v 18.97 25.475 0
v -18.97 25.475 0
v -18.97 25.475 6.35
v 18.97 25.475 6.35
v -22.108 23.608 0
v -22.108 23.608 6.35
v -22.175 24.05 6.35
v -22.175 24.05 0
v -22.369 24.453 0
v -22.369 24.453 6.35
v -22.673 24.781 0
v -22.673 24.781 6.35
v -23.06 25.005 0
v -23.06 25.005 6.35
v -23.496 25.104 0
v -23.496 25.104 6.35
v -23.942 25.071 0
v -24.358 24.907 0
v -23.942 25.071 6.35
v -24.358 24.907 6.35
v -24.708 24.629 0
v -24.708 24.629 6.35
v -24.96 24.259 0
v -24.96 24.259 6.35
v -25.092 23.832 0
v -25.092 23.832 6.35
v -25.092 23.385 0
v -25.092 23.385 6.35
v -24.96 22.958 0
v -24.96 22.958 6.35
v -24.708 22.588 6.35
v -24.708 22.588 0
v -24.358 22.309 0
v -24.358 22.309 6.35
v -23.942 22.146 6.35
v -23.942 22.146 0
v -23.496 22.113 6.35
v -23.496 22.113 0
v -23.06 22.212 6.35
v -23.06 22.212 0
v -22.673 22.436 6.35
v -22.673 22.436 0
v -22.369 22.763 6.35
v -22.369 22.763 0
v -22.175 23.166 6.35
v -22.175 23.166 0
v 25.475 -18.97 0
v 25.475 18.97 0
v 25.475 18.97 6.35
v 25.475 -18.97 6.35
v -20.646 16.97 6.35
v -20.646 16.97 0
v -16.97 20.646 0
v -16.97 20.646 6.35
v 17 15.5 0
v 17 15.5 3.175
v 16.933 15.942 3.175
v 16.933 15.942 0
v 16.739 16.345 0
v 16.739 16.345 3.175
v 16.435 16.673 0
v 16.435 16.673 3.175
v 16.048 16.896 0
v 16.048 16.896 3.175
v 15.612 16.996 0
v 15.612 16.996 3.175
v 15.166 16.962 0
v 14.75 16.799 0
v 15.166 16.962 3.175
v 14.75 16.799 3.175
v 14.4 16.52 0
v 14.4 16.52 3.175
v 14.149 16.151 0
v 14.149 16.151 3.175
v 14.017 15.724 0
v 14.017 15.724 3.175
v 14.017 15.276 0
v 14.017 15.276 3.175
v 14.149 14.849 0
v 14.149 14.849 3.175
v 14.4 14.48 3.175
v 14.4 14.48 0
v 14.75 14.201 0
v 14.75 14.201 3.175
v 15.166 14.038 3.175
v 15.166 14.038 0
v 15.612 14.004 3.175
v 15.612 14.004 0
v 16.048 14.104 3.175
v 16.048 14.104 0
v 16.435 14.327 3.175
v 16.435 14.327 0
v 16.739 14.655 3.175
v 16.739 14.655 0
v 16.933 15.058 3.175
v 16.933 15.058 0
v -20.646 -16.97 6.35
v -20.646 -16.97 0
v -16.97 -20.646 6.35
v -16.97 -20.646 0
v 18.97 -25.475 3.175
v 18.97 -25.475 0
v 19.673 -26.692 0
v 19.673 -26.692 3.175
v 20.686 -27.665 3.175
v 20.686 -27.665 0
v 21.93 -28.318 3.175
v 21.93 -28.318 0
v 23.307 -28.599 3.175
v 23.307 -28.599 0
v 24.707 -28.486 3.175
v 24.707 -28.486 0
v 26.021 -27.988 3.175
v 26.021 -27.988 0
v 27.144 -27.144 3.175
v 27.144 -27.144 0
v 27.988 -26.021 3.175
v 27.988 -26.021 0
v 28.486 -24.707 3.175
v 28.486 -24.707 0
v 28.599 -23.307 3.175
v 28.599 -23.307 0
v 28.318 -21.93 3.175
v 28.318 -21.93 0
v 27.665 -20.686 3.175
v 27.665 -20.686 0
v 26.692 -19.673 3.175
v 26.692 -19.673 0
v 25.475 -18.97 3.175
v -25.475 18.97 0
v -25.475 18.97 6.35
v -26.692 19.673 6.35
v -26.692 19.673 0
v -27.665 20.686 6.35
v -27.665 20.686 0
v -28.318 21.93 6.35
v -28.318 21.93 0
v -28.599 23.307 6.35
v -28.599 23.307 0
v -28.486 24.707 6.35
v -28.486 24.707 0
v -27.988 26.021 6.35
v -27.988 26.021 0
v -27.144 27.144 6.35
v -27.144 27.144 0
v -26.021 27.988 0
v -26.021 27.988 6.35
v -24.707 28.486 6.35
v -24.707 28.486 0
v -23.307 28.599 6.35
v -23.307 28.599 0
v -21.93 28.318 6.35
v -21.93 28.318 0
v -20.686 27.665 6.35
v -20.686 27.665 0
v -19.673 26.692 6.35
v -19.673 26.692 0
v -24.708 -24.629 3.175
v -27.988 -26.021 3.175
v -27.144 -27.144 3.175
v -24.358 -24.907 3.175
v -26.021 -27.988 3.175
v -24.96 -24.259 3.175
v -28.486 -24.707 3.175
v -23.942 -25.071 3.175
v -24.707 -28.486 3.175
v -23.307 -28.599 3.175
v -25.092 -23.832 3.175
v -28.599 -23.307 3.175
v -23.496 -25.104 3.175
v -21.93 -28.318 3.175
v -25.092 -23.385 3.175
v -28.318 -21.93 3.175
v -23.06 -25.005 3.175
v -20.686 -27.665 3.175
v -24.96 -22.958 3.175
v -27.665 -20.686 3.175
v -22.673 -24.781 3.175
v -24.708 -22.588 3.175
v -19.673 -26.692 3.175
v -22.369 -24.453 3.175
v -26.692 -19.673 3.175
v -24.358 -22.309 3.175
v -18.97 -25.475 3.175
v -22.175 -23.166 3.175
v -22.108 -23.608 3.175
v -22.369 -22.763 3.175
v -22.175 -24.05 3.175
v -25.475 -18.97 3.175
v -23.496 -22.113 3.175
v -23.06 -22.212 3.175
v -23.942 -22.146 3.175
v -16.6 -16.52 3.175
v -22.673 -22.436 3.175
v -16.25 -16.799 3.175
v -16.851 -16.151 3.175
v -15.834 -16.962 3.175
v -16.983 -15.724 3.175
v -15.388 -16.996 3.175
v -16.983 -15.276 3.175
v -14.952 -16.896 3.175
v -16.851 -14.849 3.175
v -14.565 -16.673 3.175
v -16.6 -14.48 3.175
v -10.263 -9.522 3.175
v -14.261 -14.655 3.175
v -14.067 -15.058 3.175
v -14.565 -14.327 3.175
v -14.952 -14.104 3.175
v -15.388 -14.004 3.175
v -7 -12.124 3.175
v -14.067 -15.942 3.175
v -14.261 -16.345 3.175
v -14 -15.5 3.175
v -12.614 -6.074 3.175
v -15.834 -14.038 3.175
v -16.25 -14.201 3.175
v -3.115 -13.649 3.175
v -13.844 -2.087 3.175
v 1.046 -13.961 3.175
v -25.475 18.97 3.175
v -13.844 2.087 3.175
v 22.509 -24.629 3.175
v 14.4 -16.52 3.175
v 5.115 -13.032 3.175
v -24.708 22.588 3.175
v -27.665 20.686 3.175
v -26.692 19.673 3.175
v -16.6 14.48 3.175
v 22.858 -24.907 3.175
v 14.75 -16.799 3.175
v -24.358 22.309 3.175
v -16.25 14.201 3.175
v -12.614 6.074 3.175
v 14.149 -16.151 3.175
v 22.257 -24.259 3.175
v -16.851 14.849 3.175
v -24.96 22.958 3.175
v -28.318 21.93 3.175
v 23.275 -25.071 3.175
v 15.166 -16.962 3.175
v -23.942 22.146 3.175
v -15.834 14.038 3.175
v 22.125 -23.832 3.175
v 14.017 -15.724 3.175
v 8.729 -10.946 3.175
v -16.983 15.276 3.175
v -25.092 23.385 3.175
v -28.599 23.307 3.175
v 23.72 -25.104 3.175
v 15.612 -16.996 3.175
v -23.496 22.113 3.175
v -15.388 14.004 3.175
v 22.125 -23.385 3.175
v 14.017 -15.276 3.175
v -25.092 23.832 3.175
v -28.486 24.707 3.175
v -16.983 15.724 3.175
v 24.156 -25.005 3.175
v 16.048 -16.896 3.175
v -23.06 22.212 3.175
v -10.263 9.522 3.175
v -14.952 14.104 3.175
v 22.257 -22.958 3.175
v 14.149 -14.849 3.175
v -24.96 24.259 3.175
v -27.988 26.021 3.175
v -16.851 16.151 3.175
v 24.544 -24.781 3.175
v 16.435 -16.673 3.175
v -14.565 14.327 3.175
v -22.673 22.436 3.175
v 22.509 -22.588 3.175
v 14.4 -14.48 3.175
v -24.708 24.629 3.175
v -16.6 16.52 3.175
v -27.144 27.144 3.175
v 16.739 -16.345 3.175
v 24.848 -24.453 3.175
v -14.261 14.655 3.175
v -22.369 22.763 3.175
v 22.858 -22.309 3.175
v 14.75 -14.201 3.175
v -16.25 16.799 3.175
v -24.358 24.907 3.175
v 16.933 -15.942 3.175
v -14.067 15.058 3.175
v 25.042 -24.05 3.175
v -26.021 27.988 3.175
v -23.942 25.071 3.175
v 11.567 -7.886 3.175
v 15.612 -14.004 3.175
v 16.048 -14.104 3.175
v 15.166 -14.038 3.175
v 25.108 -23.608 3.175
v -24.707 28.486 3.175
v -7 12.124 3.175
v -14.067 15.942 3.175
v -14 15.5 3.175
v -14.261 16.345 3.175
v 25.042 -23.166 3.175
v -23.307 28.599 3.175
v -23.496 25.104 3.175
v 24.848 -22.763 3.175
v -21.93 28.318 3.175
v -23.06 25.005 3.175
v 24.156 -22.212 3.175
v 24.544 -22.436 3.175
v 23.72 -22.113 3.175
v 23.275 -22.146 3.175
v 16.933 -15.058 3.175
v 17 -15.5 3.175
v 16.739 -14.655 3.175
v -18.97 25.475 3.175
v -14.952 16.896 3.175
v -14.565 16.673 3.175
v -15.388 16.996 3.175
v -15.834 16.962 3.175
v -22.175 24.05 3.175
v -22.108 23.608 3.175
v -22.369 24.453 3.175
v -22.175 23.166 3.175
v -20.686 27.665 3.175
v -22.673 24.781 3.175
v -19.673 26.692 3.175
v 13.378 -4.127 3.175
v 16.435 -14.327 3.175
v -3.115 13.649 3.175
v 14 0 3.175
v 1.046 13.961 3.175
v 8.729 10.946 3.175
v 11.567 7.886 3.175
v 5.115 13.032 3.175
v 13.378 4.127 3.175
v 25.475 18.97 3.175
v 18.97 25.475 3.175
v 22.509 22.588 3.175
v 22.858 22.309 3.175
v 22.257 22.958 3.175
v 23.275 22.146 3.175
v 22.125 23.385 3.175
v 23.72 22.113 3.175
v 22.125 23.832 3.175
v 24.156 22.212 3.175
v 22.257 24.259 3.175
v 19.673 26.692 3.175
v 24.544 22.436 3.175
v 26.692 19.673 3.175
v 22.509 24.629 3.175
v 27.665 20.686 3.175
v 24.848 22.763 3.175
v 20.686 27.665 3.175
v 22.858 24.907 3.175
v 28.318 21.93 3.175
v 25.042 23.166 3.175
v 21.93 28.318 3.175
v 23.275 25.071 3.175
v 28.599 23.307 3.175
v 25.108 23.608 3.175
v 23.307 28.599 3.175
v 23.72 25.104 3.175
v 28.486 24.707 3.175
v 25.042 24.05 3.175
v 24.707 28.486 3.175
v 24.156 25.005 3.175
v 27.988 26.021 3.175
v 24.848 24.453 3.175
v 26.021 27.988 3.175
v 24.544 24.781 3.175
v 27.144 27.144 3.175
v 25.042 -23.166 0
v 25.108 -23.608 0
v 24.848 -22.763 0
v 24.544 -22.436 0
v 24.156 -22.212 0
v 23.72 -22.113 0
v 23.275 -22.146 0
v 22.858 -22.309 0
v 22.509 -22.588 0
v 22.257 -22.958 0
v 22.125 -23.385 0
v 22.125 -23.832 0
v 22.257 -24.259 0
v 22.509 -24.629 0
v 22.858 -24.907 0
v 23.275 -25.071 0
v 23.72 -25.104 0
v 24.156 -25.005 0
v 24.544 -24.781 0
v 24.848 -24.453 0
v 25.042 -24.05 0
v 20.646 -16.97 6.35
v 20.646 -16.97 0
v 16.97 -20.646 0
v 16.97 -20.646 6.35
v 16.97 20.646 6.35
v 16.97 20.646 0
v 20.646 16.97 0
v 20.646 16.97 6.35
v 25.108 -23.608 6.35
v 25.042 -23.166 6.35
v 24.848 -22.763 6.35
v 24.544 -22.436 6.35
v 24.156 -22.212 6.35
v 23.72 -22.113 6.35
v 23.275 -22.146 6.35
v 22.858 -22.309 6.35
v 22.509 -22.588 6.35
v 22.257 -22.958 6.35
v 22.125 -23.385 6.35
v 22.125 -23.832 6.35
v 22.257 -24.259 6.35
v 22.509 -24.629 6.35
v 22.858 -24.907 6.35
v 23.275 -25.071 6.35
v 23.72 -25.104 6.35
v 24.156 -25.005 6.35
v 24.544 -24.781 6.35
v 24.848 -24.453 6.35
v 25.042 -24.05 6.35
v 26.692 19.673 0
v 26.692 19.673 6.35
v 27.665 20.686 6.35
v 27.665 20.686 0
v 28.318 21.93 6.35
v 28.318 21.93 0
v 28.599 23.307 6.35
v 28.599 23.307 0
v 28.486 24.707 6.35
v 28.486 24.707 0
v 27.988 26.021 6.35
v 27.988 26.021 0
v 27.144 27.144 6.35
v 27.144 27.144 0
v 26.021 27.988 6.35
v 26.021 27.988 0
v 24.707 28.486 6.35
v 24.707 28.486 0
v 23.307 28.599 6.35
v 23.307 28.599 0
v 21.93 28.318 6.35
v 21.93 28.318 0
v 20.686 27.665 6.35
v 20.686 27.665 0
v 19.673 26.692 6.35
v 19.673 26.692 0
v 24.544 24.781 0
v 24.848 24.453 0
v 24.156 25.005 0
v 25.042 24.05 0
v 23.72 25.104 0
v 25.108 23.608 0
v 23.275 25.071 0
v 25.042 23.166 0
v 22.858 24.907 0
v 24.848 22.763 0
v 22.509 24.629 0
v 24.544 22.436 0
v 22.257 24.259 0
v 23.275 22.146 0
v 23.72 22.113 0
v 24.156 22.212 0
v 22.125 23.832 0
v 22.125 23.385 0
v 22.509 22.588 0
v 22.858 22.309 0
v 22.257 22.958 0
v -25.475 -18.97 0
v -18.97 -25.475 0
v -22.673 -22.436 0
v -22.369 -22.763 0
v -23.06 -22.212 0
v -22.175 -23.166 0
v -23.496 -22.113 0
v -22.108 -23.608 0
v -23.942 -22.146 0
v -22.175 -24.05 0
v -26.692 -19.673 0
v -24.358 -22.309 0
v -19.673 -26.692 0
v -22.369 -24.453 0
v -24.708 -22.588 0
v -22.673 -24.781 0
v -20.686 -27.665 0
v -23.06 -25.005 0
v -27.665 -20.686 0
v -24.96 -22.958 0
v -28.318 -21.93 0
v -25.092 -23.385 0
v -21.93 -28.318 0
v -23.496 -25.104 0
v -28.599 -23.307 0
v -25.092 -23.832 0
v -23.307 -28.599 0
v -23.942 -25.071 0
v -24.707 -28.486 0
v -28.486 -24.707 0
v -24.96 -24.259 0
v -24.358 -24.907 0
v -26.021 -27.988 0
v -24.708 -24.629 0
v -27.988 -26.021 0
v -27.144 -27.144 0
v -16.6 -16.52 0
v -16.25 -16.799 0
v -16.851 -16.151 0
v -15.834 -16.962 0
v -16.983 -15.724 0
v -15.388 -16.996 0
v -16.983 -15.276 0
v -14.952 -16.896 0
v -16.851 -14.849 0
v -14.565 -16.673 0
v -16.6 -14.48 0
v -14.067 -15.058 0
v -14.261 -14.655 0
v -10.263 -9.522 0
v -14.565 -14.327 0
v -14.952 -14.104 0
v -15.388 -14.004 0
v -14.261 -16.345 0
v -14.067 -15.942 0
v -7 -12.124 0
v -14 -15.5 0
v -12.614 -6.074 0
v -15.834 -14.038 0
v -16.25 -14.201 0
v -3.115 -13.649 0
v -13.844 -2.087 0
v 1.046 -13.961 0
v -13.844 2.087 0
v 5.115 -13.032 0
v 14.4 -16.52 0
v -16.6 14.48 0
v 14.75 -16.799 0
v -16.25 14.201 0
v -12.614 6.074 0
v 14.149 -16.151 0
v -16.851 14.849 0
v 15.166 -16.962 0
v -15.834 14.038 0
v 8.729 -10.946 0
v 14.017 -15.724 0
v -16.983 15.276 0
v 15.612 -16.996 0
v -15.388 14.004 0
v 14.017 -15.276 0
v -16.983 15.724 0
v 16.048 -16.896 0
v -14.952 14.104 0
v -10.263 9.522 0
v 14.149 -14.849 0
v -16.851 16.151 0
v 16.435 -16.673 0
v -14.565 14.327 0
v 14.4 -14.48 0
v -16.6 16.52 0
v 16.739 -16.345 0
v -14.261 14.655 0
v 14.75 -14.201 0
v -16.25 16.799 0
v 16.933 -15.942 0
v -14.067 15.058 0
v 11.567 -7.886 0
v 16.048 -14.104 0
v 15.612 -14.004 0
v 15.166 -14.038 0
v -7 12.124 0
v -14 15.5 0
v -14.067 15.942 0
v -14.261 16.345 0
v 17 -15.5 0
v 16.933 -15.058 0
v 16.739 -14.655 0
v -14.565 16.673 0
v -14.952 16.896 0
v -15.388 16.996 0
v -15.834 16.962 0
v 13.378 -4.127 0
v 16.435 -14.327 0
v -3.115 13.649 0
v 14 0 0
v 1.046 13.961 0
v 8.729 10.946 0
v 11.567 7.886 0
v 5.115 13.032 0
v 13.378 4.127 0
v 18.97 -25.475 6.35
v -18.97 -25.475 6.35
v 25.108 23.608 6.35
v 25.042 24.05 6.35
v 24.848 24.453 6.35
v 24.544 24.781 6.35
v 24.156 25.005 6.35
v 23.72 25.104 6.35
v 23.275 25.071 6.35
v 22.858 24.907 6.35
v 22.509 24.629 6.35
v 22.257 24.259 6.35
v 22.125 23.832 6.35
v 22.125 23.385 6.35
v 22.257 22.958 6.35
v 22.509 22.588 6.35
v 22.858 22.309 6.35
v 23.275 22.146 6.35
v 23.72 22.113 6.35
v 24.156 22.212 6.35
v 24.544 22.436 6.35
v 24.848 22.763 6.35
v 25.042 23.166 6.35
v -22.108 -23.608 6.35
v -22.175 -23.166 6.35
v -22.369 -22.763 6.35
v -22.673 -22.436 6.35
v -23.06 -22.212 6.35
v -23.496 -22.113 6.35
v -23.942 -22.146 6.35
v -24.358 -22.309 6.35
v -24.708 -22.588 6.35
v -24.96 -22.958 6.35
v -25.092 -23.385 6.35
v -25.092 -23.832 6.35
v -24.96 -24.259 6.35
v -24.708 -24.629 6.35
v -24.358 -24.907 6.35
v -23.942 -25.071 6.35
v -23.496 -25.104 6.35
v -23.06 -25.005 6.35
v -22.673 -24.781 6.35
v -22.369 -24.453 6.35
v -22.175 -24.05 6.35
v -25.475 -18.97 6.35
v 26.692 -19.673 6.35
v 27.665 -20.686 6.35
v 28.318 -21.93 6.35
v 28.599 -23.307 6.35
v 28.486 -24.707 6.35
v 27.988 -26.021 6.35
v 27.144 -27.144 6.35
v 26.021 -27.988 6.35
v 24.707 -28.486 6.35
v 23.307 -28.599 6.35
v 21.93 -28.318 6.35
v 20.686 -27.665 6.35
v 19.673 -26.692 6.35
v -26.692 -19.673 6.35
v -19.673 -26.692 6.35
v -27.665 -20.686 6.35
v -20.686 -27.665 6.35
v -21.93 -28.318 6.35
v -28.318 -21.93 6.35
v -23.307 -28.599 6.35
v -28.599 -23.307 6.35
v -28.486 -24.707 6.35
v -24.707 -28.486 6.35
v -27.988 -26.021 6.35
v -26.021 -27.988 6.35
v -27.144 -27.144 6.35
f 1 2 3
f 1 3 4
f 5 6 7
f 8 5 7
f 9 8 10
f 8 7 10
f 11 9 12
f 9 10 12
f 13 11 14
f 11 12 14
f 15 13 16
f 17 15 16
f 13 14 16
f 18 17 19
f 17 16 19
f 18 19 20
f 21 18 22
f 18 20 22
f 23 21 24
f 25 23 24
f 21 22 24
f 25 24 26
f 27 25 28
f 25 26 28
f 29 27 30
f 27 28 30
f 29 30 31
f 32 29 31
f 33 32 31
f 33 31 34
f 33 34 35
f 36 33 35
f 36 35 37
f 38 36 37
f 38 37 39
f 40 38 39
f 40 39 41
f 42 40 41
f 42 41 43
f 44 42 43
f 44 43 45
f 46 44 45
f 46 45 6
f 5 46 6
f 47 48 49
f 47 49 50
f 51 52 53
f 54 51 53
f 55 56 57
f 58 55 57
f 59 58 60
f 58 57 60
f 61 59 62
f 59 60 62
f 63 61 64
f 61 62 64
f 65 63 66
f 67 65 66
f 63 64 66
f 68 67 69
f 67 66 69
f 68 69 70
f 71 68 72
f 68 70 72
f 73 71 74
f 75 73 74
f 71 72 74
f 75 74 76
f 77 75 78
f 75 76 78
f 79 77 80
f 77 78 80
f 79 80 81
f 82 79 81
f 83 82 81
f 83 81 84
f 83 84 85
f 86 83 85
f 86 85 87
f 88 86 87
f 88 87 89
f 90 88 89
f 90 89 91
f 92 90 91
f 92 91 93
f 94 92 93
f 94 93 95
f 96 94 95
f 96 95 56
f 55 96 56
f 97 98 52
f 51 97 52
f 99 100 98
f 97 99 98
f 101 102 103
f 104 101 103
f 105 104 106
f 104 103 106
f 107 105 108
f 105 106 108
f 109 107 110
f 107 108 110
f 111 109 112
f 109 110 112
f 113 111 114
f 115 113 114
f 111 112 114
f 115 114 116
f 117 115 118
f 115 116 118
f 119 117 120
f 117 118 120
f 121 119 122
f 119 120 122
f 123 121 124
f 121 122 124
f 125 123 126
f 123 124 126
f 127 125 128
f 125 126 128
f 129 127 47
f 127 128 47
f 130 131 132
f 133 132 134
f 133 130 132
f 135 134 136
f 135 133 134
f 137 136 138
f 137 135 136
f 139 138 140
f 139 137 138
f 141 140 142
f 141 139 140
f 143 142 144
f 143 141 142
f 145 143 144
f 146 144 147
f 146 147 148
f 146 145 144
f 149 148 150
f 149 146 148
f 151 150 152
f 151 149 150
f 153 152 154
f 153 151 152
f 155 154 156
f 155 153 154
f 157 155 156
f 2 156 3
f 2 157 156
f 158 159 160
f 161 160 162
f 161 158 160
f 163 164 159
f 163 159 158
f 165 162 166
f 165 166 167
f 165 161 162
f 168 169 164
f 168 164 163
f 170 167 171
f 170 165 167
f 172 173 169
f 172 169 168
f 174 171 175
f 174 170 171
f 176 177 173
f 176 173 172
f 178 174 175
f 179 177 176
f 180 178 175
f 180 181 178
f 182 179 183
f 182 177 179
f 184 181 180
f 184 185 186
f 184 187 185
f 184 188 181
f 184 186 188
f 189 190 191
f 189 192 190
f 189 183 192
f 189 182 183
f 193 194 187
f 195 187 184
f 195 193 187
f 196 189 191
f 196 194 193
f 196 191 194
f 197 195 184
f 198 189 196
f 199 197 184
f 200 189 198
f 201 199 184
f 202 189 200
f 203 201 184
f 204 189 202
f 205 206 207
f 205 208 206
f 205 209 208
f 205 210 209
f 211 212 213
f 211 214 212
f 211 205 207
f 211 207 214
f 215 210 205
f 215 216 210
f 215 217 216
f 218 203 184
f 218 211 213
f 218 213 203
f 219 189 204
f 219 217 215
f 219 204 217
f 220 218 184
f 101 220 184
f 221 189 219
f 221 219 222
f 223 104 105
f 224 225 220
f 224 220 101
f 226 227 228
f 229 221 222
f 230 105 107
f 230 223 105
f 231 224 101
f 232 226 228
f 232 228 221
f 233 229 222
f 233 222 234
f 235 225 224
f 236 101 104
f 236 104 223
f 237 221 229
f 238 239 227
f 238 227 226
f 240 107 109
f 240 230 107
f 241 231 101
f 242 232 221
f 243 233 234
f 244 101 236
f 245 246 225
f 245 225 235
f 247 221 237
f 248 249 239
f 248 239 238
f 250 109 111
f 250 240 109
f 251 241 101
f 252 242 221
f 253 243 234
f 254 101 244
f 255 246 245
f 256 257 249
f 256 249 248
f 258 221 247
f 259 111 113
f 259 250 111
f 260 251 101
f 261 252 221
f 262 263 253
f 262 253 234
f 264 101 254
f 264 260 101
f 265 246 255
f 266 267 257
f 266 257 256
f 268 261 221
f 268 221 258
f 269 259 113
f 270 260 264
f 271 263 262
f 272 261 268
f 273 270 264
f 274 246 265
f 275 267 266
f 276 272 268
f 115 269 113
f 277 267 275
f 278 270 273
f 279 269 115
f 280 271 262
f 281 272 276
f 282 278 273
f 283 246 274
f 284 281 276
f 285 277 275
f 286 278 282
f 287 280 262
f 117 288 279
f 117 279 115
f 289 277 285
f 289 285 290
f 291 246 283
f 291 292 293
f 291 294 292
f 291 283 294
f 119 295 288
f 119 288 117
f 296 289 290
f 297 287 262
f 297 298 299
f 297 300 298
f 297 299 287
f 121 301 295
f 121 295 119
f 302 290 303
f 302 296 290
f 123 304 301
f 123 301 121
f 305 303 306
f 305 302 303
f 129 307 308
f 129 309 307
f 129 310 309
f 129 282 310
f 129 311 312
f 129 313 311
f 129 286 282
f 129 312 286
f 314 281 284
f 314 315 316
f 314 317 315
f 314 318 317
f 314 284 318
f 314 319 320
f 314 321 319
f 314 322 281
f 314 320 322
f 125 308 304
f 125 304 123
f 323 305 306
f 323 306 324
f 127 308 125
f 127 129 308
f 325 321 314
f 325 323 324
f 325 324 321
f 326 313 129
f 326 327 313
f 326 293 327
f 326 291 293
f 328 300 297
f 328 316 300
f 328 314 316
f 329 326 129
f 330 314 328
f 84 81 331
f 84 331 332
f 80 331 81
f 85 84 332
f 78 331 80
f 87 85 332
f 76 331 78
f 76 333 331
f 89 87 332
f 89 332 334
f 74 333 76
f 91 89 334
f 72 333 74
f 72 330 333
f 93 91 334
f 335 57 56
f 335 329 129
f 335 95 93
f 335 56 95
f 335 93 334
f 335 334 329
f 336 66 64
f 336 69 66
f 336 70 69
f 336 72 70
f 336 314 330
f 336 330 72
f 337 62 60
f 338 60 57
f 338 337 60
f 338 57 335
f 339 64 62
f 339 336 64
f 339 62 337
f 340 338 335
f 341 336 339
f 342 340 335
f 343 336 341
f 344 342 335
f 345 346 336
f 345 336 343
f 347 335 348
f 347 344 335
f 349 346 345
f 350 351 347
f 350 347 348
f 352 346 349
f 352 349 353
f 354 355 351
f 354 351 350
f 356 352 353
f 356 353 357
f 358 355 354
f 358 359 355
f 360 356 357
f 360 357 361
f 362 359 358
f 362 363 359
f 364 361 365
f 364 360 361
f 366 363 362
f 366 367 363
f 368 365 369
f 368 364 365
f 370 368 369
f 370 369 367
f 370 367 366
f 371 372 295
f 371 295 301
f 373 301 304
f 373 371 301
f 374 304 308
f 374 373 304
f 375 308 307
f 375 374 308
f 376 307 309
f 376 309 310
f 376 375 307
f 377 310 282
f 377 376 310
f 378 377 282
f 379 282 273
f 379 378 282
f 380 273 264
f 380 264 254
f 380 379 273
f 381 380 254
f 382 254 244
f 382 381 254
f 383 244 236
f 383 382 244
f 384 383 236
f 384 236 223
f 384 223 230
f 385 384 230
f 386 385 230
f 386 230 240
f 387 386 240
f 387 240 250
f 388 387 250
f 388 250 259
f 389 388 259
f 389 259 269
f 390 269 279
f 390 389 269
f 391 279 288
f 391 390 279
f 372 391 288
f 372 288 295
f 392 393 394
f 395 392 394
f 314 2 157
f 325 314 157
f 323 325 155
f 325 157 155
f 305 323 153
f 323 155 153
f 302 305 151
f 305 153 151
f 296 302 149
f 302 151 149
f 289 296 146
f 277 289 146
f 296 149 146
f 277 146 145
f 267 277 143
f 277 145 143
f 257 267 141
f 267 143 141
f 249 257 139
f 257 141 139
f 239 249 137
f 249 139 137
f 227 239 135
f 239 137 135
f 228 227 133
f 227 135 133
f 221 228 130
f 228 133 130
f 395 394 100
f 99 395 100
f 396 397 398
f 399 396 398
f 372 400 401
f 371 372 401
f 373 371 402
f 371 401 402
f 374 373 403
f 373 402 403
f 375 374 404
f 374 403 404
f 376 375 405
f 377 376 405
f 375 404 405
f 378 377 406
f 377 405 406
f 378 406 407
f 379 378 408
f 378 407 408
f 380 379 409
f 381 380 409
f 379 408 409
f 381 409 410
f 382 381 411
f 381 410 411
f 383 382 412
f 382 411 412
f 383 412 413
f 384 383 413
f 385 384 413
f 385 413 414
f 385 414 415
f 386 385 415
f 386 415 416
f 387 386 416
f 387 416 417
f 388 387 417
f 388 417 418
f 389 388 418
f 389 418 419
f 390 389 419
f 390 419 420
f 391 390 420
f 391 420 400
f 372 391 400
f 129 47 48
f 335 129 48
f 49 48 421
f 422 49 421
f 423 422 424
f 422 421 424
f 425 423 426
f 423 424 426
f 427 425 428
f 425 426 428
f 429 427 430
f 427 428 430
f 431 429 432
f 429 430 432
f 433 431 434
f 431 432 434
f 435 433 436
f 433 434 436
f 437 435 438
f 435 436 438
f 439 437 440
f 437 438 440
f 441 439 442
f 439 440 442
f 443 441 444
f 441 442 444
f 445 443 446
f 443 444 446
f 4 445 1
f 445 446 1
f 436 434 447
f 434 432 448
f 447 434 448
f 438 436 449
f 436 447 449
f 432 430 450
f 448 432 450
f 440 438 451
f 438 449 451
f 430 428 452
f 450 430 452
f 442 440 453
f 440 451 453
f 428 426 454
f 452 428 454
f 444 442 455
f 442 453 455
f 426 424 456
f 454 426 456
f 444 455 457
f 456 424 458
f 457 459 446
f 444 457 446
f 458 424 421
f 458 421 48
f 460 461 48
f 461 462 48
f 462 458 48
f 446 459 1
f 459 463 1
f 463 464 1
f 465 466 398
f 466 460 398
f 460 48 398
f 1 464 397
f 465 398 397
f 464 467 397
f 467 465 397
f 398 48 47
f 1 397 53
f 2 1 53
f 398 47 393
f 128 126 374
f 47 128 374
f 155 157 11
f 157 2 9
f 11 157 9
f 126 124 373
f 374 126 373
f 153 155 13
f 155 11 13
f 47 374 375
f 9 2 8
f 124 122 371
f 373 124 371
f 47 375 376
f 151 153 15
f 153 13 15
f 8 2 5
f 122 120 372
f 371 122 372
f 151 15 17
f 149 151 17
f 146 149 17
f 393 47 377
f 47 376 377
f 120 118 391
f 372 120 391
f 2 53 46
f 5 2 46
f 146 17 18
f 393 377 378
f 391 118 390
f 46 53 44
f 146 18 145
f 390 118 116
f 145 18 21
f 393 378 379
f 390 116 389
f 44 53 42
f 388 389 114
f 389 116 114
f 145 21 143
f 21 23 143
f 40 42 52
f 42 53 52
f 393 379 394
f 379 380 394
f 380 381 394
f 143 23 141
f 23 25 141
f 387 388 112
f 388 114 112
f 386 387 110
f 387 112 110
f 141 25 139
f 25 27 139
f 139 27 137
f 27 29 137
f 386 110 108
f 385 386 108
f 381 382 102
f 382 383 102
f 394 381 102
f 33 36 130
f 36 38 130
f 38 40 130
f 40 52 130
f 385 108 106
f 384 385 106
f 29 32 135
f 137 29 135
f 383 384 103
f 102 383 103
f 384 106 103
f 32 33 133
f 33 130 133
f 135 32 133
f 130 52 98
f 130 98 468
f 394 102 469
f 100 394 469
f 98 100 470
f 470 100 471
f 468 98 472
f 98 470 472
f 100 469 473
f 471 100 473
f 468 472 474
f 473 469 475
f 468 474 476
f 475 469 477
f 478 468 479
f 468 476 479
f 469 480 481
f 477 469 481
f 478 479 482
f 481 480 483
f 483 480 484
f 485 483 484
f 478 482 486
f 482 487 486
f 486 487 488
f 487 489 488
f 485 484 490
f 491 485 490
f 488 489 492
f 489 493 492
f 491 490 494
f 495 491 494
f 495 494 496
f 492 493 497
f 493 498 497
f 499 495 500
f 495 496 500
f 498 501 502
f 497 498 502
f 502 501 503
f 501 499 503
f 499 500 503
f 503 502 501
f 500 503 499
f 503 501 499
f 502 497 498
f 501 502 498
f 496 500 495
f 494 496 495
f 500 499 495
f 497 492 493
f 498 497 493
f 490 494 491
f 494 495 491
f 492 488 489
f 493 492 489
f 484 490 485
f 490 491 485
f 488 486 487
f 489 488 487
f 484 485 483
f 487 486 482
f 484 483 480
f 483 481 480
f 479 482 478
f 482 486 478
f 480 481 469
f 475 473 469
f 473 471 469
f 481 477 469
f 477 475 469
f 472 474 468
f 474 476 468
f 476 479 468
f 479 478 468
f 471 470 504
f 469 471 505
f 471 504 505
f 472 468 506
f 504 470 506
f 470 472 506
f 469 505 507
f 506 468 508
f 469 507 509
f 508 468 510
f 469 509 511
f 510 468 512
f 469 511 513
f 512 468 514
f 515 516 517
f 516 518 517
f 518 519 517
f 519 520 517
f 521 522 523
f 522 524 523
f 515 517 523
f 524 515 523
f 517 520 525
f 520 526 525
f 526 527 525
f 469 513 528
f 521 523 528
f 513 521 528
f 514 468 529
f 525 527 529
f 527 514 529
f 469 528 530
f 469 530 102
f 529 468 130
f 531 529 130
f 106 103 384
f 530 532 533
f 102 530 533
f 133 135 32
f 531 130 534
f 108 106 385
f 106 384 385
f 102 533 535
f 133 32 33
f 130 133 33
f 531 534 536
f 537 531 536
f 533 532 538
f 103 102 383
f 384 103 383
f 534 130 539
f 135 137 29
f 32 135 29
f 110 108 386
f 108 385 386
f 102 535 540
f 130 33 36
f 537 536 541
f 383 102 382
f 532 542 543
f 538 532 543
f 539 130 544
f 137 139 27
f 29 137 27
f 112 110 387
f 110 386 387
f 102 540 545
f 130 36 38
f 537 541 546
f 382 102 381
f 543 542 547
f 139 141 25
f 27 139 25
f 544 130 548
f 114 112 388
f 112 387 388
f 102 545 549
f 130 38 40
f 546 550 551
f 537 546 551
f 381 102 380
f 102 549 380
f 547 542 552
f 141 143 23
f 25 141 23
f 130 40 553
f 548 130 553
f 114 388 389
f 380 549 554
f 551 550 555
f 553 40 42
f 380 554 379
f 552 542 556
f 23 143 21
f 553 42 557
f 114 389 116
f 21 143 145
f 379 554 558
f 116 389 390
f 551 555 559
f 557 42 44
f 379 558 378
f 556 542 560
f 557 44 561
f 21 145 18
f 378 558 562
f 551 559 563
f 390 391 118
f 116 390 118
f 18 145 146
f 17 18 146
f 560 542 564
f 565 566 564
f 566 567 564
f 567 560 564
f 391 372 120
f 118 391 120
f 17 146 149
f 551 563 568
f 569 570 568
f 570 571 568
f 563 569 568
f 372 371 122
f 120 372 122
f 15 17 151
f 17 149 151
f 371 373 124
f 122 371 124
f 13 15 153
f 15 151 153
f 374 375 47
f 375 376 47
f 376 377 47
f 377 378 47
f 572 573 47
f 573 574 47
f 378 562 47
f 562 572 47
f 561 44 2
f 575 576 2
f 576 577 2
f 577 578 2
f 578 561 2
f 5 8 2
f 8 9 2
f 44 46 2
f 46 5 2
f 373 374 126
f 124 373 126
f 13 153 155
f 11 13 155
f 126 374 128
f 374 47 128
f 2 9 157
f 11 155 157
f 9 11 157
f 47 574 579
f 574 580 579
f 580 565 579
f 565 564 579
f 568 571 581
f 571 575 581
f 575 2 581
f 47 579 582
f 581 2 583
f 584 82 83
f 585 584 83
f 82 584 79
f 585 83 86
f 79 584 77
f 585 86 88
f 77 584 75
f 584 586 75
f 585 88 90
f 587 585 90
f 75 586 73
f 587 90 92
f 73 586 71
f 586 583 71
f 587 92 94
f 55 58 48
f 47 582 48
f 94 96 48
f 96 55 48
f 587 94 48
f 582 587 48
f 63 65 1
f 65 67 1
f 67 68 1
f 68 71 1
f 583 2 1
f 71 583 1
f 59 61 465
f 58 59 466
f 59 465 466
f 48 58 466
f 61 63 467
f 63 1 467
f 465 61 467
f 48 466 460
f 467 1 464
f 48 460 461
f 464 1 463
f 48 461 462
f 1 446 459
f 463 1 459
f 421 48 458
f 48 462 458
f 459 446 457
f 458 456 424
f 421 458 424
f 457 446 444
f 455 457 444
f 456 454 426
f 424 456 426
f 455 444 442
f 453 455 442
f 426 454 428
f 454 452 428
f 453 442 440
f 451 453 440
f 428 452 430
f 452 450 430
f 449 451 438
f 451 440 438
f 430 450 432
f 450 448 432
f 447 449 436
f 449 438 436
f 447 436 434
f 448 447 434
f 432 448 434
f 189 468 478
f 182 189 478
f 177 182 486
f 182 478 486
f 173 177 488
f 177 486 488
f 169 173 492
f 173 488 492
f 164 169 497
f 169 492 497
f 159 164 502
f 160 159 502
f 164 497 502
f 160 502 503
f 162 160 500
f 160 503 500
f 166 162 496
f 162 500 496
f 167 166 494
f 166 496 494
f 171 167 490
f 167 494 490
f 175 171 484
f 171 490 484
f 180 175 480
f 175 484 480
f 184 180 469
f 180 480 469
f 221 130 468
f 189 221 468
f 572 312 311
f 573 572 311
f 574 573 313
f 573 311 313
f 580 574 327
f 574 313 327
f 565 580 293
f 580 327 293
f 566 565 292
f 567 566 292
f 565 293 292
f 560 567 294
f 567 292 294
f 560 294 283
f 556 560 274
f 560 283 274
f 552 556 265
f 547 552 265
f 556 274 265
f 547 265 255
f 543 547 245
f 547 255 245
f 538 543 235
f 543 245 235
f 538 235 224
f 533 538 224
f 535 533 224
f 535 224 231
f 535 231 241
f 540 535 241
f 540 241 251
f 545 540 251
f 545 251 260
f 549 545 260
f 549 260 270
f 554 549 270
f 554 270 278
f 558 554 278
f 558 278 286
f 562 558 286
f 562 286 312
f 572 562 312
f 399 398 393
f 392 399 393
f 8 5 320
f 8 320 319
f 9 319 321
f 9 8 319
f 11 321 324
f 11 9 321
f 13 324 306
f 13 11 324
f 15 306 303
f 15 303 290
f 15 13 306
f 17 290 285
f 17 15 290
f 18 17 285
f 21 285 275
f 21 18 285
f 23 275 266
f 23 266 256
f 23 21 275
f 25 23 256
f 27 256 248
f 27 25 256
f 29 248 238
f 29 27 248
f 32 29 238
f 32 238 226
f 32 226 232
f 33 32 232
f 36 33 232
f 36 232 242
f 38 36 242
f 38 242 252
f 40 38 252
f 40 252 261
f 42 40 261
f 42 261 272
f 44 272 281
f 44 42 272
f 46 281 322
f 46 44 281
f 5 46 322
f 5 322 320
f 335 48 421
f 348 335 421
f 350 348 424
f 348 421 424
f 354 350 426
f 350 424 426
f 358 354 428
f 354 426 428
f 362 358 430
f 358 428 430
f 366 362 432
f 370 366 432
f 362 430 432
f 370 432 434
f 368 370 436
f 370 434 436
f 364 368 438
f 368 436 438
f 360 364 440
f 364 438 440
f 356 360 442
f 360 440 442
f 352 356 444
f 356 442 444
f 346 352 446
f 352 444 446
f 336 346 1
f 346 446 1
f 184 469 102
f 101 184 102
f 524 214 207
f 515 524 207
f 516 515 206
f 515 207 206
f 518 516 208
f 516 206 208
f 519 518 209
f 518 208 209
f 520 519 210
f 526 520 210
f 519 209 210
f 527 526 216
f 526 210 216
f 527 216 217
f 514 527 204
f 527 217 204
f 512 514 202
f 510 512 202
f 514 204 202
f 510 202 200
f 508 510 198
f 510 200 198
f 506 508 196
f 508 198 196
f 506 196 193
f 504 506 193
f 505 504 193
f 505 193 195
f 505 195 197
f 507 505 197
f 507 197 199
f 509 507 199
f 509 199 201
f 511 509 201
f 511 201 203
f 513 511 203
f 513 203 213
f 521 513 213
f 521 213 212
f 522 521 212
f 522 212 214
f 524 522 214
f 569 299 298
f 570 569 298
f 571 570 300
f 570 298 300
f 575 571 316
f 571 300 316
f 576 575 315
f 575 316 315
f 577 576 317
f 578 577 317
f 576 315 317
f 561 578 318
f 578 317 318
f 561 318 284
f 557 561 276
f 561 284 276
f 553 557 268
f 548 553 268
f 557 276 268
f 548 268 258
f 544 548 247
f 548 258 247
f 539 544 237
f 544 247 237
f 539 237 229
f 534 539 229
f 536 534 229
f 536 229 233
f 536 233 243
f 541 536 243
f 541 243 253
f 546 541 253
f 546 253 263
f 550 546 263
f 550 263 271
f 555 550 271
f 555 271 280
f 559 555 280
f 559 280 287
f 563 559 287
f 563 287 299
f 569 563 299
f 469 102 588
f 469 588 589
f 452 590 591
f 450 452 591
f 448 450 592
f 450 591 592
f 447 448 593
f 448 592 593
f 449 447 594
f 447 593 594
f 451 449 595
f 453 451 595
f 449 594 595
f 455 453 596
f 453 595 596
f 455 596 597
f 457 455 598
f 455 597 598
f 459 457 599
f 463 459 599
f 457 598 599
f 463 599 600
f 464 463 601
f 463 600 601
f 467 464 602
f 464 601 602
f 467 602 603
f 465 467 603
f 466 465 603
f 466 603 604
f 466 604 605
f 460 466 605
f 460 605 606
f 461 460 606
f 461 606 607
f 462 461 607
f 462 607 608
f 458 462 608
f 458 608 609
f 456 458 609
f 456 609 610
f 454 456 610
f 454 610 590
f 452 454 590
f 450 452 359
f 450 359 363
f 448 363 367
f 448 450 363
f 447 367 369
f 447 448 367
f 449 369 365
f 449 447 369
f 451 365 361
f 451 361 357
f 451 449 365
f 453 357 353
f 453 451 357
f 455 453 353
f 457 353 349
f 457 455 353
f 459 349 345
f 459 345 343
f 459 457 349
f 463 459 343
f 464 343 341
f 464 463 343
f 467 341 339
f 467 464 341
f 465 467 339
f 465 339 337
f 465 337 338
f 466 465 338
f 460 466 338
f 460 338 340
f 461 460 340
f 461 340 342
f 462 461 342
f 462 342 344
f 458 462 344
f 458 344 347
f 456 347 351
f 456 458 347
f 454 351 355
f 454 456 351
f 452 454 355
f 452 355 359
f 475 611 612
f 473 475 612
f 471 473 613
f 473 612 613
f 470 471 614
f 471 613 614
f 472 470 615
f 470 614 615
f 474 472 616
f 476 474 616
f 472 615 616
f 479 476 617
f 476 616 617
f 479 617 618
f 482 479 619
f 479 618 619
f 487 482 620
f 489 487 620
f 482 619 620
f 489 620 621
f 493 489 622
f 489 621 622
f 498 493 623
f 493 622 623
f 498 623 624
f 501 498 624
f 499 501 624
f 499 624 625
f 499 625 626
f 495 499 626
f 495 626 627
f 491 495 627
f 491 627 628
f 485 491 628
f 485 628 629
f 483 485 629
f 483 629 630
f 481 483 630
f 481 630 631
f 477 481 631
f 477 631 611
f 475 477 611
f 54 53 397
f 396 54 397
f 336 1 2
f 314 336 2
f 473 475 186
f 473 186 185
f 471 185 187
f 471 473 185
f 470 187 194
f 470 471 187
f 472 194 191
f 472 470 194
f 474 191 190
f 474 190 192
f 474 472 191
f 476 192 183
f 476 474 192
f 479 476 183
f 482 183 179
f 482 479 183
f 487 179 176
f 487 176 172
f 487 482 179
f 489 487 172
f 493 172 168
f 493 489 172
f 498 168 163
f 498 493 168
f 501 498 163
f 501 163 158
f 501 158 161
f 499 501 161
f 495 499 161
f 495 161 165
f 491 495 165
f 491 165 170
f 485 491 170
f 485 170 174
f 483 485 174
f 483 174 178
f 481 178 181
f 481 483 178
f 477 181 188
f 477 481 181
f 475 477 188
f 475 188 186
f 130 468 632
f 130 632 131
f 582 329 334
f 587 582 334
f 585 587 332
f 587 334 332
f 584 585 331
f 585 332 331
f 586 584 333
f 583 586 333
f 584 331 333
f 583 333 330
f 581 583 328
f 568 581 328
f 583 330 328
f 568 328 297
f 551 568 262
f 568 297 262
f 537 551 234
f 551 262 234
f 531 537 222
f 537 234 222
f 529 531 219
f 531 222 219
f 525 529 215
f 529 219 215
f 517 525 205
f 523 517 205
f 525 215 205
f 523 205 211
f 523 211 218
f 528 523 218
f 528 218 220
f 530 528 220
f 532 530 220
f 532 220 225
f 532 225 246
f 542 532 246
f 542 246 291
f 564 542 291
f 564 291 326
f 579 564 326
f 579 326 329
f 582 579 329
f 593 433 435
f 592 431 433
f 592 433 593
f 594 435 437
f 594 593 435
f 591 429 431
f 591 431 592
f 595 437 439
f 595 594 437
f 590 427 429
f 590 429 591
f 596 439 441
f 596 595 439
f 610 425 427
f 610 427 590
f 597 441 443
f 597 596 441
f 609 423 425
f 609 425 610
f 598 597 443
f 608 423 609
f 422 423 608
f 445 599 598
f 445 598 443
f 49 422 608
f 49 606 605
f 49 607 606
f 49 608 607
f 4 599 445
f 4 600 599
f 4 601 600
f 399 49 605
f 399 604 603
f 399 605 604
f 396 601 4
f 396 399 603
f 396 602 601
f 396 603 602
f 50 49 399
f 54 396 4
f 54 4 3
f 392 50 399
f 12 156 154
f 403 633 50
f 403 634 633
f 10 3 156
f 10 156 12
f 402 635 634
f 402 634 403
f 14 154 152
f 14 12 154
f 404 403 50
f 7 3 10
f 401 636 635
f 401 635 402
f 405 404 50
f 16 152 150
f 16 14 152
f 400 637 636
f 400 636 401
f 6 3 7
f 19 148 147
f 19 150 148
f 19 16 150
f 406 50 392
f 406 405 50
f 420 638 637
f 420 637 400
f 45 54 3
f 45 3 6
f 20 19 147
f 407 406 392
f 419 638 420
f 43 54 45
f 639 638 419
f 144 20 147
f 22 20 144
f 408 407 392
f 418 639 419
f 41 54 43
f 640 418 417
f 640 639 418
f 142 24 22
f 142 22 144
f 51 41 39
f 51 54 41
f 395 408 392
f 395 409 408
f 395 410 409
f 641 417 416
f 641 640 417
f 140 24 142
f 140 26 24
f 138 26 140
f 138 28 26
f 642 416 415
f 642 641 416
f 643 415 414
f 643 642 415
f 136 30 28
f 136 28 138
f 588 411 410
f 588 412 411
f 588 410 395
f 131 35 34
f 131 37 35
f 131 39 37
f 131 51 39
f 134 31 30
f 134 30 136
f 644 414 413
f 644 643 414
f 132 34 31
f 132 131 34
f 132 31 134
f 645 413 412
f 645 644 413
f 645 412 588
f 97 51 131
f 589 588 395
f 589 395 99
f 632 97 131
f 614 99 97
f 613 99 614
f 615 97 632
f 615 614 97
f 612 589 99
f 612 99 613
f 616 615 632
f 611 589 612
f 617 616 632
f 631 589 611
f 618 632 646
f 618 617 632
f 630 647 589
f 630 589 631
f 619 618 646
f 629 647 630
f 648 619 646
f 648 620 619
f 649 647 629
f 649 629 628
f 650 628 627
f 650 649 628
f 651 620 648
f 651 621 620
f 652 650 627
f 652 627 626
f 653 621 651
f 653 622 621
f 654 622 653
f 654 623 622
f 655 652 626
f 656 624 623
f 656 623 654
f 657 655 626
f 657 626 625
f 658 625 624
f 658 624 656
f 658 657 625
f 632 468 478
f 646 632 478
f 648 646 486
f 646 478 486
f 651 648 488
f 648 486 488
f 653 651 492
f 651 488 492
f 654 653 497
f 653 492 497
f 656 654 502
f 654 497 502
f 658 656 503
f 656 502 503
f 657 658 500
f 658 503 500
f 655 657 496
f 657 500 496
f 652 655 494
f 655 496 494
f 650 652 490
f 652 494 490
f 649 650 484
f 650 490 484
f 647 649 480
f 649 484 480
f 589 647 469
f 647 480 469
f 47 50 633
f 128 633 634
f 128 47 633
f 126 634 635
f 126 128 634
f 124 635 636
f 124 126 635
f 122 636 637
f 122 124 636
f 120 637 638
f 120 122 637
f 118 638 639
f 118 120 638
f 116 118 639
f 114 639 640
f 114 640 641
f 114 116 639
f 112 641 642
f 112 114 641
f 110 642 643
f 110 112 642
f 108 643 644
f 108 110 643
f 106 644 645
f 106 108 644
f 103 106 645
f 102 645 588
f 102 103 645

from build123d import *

# Parameters (mm, degrees)
BOSS_EXTRU_2_DEPTH        = 6.35
ESQUISSE29_R              = 5
BOSS_EXTRU_3_DEPTH        = 6.35
SYM_TRIE2_COPY_1_SKETCH_R = 5
SYM_TRIE2_COPY_1_DEPTH    = 6.35
ESQUISSE30_R              = 1.5
ENL_V_MAT_EXTRU_1_DEPTH   = 41.953581056
ESQUISSE31_R              = 1.5
BOSS_EXTRU_4_DEPTH        = 3.175
ESQUISSE32_R              = 1.5
ESQUISSE32_R_2            = 14
ENL_V_MAT_EXTRU_2_DEPTH   = 41.582680127


with BuildPart() as part:
    # Esquisse28 → Boss.-Extru.2 (new body)
    with BuildSketch(Plane.XY):
        Polygon((-18.97, -25.475382387), (-25.475382387, -18.97), (-25.475382387, 18.97), (-18.97, 25.475382387), (18.97, 25.475382387), (25.475382387, 18.97), (25.475382387, -18.97), (18.97, -25.475382387), align=None)
        Polygon((-16.97, -20.645541049), (-20.645541049, -16.97), (-20.645541049, 16.97), (-16.97, 20.645541049), (16.97, 20.645541049), (20.645541049, 16.97), (20.645541049, -16.97), (16.97, -20.645541049), align=None, mode=Mode.SUBTRACT)
    extrude(amount=BOSS_EXTRU_2_DEPTH)

    # Esquisse29 → Boss.-Extru.3 (add)
    with BuildSketch(Plane.XY):
        with Locations((23.60833184, 23.60833184)):
            Circle(ESQUISSE29_R)
    boss_extru_3 = extrude(amount=BOSS_EXTRU_3_DEPTH)

    # Symétrie1: Boss.-Extru.3 across plane
    add(boss_extru_3.mirror(Plane(origin=(0, 0, 0), x_dir=(0, 0, 1), z_dir=(1, 0, 0))))

    # Symétrie2: Boss.-Extru.3 across plane
    add(boss_extru_3.mirror(Plane.ZX))

    # Symétrie2 copy 1 sketch → Symétrie2 copy 1 (add)
    with BuildSketch(Plane(origin=(0, 0, 0), x_dir=(-1, 0, 0), z_dir=(0, 0, 1))):
        with Locations((23.60833184, 23.60833184)):
            Circle(SYM_TRIE2_COPY_1_SKETCH_R)
    extrude(amount=SYM_TRIE2_COPY_1_DEPTH)

    # Esquisse30 → Enlèv. mat.-Extru.1 (cut, through all)
    with BuildSketch(Plane.XY.offset(6.35)):
        with Locations((-23.60833184, 23.60833184)):
            Circle(ESQUISSE30_R)
        with Locations((23.60833184, 23.60833184)):
            Circle(ESQUISSE30_R)
        with Locations((23.60833184, -23.60833184)):
            Circle(ESQUISSE30_R)
        with Locations((-23.60833184, -23.60833184)):
            Circle(ESQUISSE30_R)
    extrude(amount=-ENL_V_MAT_EXTRU_1_DEPTH, mode=Mode.SUBTRACT)


with BuildPart() as body_2:
    # Esquisse31 → Boss.-Extru.4 (new body)
    with BuildSketch(Plane.XY):
        with BuildLine():
            Line((-18.97, -25.475382387), (18.97, -25.475382387))
            ThreePointArc((18.97, -25.475382387), (27.143865745, -27.143865745), (25.475382387, -18.97))
            Line((25.475382387, -18.97), (25.475382387, 18.97))
            ThreePointArc((25.475382387, 18.97), (27.143865745, 27.143865745), (18.97, 25.475382387))
            Line((18.97, 25.475382387), (-18.97, 25.475382387))
            ThreePointArc((-18.97, 25.475382387), (-27.143865745, 27.143865745), (-25.475382387, 18.97))
            Line((-25.475382387, 18.97), (-25.475382387, -18.97))
            ThreePointArc((-25.475382387, -18.97), (-27.143865745, -27.143865745), (-18.97, -25.475382387))
        make_face()
        with Locations((23.60833184, 23.60833184)):
            Circle(ESQUISSE31_R, mode=Mode.SUBTRACT)
        with Locations((-23.60833184, 23.60833184)):
            Circle(ESQUISSE31_R, mode=Mode.SUBTRACT)
        with Locations((-23.60833184, -23.60833184)):
            Circle(ESQUISSE31_R, mode=Mode.SUBTRACT)
        with Locations((23.60833184, -23.60833184)):
            Circle(ESQUISSE31_R, mode=Mode.SUBTRACT)
    extrude(amount=BOSS_EXTRU_4_DEPTH)

    # Esquisse32 → Enlèv. mat.-Extru.2 (cut, through all)
    with BuildSketch(Plane.XY.offset(3.175)):
        with Locations((-15.5, -15.5)):
            Circle(ESQUISSE32_R)
        with Locations((15.5, -15.5)):
            Circle(ESQUISSE32_R)
        with Locations((15.5, 15.5)):
            Circle(ESQUISSE32_R)
        with Locations((-15.5, 15.5)):
            Circle(ESQUISSE32_R)
        Circle(ESQUISSE32_R_2)
    extrude(amount=-ENL_V_MAT_EXTRU_2_DEPTH, mode=Mode.SUBTRACT)


solid = Compound([part.part, body_2.part])
